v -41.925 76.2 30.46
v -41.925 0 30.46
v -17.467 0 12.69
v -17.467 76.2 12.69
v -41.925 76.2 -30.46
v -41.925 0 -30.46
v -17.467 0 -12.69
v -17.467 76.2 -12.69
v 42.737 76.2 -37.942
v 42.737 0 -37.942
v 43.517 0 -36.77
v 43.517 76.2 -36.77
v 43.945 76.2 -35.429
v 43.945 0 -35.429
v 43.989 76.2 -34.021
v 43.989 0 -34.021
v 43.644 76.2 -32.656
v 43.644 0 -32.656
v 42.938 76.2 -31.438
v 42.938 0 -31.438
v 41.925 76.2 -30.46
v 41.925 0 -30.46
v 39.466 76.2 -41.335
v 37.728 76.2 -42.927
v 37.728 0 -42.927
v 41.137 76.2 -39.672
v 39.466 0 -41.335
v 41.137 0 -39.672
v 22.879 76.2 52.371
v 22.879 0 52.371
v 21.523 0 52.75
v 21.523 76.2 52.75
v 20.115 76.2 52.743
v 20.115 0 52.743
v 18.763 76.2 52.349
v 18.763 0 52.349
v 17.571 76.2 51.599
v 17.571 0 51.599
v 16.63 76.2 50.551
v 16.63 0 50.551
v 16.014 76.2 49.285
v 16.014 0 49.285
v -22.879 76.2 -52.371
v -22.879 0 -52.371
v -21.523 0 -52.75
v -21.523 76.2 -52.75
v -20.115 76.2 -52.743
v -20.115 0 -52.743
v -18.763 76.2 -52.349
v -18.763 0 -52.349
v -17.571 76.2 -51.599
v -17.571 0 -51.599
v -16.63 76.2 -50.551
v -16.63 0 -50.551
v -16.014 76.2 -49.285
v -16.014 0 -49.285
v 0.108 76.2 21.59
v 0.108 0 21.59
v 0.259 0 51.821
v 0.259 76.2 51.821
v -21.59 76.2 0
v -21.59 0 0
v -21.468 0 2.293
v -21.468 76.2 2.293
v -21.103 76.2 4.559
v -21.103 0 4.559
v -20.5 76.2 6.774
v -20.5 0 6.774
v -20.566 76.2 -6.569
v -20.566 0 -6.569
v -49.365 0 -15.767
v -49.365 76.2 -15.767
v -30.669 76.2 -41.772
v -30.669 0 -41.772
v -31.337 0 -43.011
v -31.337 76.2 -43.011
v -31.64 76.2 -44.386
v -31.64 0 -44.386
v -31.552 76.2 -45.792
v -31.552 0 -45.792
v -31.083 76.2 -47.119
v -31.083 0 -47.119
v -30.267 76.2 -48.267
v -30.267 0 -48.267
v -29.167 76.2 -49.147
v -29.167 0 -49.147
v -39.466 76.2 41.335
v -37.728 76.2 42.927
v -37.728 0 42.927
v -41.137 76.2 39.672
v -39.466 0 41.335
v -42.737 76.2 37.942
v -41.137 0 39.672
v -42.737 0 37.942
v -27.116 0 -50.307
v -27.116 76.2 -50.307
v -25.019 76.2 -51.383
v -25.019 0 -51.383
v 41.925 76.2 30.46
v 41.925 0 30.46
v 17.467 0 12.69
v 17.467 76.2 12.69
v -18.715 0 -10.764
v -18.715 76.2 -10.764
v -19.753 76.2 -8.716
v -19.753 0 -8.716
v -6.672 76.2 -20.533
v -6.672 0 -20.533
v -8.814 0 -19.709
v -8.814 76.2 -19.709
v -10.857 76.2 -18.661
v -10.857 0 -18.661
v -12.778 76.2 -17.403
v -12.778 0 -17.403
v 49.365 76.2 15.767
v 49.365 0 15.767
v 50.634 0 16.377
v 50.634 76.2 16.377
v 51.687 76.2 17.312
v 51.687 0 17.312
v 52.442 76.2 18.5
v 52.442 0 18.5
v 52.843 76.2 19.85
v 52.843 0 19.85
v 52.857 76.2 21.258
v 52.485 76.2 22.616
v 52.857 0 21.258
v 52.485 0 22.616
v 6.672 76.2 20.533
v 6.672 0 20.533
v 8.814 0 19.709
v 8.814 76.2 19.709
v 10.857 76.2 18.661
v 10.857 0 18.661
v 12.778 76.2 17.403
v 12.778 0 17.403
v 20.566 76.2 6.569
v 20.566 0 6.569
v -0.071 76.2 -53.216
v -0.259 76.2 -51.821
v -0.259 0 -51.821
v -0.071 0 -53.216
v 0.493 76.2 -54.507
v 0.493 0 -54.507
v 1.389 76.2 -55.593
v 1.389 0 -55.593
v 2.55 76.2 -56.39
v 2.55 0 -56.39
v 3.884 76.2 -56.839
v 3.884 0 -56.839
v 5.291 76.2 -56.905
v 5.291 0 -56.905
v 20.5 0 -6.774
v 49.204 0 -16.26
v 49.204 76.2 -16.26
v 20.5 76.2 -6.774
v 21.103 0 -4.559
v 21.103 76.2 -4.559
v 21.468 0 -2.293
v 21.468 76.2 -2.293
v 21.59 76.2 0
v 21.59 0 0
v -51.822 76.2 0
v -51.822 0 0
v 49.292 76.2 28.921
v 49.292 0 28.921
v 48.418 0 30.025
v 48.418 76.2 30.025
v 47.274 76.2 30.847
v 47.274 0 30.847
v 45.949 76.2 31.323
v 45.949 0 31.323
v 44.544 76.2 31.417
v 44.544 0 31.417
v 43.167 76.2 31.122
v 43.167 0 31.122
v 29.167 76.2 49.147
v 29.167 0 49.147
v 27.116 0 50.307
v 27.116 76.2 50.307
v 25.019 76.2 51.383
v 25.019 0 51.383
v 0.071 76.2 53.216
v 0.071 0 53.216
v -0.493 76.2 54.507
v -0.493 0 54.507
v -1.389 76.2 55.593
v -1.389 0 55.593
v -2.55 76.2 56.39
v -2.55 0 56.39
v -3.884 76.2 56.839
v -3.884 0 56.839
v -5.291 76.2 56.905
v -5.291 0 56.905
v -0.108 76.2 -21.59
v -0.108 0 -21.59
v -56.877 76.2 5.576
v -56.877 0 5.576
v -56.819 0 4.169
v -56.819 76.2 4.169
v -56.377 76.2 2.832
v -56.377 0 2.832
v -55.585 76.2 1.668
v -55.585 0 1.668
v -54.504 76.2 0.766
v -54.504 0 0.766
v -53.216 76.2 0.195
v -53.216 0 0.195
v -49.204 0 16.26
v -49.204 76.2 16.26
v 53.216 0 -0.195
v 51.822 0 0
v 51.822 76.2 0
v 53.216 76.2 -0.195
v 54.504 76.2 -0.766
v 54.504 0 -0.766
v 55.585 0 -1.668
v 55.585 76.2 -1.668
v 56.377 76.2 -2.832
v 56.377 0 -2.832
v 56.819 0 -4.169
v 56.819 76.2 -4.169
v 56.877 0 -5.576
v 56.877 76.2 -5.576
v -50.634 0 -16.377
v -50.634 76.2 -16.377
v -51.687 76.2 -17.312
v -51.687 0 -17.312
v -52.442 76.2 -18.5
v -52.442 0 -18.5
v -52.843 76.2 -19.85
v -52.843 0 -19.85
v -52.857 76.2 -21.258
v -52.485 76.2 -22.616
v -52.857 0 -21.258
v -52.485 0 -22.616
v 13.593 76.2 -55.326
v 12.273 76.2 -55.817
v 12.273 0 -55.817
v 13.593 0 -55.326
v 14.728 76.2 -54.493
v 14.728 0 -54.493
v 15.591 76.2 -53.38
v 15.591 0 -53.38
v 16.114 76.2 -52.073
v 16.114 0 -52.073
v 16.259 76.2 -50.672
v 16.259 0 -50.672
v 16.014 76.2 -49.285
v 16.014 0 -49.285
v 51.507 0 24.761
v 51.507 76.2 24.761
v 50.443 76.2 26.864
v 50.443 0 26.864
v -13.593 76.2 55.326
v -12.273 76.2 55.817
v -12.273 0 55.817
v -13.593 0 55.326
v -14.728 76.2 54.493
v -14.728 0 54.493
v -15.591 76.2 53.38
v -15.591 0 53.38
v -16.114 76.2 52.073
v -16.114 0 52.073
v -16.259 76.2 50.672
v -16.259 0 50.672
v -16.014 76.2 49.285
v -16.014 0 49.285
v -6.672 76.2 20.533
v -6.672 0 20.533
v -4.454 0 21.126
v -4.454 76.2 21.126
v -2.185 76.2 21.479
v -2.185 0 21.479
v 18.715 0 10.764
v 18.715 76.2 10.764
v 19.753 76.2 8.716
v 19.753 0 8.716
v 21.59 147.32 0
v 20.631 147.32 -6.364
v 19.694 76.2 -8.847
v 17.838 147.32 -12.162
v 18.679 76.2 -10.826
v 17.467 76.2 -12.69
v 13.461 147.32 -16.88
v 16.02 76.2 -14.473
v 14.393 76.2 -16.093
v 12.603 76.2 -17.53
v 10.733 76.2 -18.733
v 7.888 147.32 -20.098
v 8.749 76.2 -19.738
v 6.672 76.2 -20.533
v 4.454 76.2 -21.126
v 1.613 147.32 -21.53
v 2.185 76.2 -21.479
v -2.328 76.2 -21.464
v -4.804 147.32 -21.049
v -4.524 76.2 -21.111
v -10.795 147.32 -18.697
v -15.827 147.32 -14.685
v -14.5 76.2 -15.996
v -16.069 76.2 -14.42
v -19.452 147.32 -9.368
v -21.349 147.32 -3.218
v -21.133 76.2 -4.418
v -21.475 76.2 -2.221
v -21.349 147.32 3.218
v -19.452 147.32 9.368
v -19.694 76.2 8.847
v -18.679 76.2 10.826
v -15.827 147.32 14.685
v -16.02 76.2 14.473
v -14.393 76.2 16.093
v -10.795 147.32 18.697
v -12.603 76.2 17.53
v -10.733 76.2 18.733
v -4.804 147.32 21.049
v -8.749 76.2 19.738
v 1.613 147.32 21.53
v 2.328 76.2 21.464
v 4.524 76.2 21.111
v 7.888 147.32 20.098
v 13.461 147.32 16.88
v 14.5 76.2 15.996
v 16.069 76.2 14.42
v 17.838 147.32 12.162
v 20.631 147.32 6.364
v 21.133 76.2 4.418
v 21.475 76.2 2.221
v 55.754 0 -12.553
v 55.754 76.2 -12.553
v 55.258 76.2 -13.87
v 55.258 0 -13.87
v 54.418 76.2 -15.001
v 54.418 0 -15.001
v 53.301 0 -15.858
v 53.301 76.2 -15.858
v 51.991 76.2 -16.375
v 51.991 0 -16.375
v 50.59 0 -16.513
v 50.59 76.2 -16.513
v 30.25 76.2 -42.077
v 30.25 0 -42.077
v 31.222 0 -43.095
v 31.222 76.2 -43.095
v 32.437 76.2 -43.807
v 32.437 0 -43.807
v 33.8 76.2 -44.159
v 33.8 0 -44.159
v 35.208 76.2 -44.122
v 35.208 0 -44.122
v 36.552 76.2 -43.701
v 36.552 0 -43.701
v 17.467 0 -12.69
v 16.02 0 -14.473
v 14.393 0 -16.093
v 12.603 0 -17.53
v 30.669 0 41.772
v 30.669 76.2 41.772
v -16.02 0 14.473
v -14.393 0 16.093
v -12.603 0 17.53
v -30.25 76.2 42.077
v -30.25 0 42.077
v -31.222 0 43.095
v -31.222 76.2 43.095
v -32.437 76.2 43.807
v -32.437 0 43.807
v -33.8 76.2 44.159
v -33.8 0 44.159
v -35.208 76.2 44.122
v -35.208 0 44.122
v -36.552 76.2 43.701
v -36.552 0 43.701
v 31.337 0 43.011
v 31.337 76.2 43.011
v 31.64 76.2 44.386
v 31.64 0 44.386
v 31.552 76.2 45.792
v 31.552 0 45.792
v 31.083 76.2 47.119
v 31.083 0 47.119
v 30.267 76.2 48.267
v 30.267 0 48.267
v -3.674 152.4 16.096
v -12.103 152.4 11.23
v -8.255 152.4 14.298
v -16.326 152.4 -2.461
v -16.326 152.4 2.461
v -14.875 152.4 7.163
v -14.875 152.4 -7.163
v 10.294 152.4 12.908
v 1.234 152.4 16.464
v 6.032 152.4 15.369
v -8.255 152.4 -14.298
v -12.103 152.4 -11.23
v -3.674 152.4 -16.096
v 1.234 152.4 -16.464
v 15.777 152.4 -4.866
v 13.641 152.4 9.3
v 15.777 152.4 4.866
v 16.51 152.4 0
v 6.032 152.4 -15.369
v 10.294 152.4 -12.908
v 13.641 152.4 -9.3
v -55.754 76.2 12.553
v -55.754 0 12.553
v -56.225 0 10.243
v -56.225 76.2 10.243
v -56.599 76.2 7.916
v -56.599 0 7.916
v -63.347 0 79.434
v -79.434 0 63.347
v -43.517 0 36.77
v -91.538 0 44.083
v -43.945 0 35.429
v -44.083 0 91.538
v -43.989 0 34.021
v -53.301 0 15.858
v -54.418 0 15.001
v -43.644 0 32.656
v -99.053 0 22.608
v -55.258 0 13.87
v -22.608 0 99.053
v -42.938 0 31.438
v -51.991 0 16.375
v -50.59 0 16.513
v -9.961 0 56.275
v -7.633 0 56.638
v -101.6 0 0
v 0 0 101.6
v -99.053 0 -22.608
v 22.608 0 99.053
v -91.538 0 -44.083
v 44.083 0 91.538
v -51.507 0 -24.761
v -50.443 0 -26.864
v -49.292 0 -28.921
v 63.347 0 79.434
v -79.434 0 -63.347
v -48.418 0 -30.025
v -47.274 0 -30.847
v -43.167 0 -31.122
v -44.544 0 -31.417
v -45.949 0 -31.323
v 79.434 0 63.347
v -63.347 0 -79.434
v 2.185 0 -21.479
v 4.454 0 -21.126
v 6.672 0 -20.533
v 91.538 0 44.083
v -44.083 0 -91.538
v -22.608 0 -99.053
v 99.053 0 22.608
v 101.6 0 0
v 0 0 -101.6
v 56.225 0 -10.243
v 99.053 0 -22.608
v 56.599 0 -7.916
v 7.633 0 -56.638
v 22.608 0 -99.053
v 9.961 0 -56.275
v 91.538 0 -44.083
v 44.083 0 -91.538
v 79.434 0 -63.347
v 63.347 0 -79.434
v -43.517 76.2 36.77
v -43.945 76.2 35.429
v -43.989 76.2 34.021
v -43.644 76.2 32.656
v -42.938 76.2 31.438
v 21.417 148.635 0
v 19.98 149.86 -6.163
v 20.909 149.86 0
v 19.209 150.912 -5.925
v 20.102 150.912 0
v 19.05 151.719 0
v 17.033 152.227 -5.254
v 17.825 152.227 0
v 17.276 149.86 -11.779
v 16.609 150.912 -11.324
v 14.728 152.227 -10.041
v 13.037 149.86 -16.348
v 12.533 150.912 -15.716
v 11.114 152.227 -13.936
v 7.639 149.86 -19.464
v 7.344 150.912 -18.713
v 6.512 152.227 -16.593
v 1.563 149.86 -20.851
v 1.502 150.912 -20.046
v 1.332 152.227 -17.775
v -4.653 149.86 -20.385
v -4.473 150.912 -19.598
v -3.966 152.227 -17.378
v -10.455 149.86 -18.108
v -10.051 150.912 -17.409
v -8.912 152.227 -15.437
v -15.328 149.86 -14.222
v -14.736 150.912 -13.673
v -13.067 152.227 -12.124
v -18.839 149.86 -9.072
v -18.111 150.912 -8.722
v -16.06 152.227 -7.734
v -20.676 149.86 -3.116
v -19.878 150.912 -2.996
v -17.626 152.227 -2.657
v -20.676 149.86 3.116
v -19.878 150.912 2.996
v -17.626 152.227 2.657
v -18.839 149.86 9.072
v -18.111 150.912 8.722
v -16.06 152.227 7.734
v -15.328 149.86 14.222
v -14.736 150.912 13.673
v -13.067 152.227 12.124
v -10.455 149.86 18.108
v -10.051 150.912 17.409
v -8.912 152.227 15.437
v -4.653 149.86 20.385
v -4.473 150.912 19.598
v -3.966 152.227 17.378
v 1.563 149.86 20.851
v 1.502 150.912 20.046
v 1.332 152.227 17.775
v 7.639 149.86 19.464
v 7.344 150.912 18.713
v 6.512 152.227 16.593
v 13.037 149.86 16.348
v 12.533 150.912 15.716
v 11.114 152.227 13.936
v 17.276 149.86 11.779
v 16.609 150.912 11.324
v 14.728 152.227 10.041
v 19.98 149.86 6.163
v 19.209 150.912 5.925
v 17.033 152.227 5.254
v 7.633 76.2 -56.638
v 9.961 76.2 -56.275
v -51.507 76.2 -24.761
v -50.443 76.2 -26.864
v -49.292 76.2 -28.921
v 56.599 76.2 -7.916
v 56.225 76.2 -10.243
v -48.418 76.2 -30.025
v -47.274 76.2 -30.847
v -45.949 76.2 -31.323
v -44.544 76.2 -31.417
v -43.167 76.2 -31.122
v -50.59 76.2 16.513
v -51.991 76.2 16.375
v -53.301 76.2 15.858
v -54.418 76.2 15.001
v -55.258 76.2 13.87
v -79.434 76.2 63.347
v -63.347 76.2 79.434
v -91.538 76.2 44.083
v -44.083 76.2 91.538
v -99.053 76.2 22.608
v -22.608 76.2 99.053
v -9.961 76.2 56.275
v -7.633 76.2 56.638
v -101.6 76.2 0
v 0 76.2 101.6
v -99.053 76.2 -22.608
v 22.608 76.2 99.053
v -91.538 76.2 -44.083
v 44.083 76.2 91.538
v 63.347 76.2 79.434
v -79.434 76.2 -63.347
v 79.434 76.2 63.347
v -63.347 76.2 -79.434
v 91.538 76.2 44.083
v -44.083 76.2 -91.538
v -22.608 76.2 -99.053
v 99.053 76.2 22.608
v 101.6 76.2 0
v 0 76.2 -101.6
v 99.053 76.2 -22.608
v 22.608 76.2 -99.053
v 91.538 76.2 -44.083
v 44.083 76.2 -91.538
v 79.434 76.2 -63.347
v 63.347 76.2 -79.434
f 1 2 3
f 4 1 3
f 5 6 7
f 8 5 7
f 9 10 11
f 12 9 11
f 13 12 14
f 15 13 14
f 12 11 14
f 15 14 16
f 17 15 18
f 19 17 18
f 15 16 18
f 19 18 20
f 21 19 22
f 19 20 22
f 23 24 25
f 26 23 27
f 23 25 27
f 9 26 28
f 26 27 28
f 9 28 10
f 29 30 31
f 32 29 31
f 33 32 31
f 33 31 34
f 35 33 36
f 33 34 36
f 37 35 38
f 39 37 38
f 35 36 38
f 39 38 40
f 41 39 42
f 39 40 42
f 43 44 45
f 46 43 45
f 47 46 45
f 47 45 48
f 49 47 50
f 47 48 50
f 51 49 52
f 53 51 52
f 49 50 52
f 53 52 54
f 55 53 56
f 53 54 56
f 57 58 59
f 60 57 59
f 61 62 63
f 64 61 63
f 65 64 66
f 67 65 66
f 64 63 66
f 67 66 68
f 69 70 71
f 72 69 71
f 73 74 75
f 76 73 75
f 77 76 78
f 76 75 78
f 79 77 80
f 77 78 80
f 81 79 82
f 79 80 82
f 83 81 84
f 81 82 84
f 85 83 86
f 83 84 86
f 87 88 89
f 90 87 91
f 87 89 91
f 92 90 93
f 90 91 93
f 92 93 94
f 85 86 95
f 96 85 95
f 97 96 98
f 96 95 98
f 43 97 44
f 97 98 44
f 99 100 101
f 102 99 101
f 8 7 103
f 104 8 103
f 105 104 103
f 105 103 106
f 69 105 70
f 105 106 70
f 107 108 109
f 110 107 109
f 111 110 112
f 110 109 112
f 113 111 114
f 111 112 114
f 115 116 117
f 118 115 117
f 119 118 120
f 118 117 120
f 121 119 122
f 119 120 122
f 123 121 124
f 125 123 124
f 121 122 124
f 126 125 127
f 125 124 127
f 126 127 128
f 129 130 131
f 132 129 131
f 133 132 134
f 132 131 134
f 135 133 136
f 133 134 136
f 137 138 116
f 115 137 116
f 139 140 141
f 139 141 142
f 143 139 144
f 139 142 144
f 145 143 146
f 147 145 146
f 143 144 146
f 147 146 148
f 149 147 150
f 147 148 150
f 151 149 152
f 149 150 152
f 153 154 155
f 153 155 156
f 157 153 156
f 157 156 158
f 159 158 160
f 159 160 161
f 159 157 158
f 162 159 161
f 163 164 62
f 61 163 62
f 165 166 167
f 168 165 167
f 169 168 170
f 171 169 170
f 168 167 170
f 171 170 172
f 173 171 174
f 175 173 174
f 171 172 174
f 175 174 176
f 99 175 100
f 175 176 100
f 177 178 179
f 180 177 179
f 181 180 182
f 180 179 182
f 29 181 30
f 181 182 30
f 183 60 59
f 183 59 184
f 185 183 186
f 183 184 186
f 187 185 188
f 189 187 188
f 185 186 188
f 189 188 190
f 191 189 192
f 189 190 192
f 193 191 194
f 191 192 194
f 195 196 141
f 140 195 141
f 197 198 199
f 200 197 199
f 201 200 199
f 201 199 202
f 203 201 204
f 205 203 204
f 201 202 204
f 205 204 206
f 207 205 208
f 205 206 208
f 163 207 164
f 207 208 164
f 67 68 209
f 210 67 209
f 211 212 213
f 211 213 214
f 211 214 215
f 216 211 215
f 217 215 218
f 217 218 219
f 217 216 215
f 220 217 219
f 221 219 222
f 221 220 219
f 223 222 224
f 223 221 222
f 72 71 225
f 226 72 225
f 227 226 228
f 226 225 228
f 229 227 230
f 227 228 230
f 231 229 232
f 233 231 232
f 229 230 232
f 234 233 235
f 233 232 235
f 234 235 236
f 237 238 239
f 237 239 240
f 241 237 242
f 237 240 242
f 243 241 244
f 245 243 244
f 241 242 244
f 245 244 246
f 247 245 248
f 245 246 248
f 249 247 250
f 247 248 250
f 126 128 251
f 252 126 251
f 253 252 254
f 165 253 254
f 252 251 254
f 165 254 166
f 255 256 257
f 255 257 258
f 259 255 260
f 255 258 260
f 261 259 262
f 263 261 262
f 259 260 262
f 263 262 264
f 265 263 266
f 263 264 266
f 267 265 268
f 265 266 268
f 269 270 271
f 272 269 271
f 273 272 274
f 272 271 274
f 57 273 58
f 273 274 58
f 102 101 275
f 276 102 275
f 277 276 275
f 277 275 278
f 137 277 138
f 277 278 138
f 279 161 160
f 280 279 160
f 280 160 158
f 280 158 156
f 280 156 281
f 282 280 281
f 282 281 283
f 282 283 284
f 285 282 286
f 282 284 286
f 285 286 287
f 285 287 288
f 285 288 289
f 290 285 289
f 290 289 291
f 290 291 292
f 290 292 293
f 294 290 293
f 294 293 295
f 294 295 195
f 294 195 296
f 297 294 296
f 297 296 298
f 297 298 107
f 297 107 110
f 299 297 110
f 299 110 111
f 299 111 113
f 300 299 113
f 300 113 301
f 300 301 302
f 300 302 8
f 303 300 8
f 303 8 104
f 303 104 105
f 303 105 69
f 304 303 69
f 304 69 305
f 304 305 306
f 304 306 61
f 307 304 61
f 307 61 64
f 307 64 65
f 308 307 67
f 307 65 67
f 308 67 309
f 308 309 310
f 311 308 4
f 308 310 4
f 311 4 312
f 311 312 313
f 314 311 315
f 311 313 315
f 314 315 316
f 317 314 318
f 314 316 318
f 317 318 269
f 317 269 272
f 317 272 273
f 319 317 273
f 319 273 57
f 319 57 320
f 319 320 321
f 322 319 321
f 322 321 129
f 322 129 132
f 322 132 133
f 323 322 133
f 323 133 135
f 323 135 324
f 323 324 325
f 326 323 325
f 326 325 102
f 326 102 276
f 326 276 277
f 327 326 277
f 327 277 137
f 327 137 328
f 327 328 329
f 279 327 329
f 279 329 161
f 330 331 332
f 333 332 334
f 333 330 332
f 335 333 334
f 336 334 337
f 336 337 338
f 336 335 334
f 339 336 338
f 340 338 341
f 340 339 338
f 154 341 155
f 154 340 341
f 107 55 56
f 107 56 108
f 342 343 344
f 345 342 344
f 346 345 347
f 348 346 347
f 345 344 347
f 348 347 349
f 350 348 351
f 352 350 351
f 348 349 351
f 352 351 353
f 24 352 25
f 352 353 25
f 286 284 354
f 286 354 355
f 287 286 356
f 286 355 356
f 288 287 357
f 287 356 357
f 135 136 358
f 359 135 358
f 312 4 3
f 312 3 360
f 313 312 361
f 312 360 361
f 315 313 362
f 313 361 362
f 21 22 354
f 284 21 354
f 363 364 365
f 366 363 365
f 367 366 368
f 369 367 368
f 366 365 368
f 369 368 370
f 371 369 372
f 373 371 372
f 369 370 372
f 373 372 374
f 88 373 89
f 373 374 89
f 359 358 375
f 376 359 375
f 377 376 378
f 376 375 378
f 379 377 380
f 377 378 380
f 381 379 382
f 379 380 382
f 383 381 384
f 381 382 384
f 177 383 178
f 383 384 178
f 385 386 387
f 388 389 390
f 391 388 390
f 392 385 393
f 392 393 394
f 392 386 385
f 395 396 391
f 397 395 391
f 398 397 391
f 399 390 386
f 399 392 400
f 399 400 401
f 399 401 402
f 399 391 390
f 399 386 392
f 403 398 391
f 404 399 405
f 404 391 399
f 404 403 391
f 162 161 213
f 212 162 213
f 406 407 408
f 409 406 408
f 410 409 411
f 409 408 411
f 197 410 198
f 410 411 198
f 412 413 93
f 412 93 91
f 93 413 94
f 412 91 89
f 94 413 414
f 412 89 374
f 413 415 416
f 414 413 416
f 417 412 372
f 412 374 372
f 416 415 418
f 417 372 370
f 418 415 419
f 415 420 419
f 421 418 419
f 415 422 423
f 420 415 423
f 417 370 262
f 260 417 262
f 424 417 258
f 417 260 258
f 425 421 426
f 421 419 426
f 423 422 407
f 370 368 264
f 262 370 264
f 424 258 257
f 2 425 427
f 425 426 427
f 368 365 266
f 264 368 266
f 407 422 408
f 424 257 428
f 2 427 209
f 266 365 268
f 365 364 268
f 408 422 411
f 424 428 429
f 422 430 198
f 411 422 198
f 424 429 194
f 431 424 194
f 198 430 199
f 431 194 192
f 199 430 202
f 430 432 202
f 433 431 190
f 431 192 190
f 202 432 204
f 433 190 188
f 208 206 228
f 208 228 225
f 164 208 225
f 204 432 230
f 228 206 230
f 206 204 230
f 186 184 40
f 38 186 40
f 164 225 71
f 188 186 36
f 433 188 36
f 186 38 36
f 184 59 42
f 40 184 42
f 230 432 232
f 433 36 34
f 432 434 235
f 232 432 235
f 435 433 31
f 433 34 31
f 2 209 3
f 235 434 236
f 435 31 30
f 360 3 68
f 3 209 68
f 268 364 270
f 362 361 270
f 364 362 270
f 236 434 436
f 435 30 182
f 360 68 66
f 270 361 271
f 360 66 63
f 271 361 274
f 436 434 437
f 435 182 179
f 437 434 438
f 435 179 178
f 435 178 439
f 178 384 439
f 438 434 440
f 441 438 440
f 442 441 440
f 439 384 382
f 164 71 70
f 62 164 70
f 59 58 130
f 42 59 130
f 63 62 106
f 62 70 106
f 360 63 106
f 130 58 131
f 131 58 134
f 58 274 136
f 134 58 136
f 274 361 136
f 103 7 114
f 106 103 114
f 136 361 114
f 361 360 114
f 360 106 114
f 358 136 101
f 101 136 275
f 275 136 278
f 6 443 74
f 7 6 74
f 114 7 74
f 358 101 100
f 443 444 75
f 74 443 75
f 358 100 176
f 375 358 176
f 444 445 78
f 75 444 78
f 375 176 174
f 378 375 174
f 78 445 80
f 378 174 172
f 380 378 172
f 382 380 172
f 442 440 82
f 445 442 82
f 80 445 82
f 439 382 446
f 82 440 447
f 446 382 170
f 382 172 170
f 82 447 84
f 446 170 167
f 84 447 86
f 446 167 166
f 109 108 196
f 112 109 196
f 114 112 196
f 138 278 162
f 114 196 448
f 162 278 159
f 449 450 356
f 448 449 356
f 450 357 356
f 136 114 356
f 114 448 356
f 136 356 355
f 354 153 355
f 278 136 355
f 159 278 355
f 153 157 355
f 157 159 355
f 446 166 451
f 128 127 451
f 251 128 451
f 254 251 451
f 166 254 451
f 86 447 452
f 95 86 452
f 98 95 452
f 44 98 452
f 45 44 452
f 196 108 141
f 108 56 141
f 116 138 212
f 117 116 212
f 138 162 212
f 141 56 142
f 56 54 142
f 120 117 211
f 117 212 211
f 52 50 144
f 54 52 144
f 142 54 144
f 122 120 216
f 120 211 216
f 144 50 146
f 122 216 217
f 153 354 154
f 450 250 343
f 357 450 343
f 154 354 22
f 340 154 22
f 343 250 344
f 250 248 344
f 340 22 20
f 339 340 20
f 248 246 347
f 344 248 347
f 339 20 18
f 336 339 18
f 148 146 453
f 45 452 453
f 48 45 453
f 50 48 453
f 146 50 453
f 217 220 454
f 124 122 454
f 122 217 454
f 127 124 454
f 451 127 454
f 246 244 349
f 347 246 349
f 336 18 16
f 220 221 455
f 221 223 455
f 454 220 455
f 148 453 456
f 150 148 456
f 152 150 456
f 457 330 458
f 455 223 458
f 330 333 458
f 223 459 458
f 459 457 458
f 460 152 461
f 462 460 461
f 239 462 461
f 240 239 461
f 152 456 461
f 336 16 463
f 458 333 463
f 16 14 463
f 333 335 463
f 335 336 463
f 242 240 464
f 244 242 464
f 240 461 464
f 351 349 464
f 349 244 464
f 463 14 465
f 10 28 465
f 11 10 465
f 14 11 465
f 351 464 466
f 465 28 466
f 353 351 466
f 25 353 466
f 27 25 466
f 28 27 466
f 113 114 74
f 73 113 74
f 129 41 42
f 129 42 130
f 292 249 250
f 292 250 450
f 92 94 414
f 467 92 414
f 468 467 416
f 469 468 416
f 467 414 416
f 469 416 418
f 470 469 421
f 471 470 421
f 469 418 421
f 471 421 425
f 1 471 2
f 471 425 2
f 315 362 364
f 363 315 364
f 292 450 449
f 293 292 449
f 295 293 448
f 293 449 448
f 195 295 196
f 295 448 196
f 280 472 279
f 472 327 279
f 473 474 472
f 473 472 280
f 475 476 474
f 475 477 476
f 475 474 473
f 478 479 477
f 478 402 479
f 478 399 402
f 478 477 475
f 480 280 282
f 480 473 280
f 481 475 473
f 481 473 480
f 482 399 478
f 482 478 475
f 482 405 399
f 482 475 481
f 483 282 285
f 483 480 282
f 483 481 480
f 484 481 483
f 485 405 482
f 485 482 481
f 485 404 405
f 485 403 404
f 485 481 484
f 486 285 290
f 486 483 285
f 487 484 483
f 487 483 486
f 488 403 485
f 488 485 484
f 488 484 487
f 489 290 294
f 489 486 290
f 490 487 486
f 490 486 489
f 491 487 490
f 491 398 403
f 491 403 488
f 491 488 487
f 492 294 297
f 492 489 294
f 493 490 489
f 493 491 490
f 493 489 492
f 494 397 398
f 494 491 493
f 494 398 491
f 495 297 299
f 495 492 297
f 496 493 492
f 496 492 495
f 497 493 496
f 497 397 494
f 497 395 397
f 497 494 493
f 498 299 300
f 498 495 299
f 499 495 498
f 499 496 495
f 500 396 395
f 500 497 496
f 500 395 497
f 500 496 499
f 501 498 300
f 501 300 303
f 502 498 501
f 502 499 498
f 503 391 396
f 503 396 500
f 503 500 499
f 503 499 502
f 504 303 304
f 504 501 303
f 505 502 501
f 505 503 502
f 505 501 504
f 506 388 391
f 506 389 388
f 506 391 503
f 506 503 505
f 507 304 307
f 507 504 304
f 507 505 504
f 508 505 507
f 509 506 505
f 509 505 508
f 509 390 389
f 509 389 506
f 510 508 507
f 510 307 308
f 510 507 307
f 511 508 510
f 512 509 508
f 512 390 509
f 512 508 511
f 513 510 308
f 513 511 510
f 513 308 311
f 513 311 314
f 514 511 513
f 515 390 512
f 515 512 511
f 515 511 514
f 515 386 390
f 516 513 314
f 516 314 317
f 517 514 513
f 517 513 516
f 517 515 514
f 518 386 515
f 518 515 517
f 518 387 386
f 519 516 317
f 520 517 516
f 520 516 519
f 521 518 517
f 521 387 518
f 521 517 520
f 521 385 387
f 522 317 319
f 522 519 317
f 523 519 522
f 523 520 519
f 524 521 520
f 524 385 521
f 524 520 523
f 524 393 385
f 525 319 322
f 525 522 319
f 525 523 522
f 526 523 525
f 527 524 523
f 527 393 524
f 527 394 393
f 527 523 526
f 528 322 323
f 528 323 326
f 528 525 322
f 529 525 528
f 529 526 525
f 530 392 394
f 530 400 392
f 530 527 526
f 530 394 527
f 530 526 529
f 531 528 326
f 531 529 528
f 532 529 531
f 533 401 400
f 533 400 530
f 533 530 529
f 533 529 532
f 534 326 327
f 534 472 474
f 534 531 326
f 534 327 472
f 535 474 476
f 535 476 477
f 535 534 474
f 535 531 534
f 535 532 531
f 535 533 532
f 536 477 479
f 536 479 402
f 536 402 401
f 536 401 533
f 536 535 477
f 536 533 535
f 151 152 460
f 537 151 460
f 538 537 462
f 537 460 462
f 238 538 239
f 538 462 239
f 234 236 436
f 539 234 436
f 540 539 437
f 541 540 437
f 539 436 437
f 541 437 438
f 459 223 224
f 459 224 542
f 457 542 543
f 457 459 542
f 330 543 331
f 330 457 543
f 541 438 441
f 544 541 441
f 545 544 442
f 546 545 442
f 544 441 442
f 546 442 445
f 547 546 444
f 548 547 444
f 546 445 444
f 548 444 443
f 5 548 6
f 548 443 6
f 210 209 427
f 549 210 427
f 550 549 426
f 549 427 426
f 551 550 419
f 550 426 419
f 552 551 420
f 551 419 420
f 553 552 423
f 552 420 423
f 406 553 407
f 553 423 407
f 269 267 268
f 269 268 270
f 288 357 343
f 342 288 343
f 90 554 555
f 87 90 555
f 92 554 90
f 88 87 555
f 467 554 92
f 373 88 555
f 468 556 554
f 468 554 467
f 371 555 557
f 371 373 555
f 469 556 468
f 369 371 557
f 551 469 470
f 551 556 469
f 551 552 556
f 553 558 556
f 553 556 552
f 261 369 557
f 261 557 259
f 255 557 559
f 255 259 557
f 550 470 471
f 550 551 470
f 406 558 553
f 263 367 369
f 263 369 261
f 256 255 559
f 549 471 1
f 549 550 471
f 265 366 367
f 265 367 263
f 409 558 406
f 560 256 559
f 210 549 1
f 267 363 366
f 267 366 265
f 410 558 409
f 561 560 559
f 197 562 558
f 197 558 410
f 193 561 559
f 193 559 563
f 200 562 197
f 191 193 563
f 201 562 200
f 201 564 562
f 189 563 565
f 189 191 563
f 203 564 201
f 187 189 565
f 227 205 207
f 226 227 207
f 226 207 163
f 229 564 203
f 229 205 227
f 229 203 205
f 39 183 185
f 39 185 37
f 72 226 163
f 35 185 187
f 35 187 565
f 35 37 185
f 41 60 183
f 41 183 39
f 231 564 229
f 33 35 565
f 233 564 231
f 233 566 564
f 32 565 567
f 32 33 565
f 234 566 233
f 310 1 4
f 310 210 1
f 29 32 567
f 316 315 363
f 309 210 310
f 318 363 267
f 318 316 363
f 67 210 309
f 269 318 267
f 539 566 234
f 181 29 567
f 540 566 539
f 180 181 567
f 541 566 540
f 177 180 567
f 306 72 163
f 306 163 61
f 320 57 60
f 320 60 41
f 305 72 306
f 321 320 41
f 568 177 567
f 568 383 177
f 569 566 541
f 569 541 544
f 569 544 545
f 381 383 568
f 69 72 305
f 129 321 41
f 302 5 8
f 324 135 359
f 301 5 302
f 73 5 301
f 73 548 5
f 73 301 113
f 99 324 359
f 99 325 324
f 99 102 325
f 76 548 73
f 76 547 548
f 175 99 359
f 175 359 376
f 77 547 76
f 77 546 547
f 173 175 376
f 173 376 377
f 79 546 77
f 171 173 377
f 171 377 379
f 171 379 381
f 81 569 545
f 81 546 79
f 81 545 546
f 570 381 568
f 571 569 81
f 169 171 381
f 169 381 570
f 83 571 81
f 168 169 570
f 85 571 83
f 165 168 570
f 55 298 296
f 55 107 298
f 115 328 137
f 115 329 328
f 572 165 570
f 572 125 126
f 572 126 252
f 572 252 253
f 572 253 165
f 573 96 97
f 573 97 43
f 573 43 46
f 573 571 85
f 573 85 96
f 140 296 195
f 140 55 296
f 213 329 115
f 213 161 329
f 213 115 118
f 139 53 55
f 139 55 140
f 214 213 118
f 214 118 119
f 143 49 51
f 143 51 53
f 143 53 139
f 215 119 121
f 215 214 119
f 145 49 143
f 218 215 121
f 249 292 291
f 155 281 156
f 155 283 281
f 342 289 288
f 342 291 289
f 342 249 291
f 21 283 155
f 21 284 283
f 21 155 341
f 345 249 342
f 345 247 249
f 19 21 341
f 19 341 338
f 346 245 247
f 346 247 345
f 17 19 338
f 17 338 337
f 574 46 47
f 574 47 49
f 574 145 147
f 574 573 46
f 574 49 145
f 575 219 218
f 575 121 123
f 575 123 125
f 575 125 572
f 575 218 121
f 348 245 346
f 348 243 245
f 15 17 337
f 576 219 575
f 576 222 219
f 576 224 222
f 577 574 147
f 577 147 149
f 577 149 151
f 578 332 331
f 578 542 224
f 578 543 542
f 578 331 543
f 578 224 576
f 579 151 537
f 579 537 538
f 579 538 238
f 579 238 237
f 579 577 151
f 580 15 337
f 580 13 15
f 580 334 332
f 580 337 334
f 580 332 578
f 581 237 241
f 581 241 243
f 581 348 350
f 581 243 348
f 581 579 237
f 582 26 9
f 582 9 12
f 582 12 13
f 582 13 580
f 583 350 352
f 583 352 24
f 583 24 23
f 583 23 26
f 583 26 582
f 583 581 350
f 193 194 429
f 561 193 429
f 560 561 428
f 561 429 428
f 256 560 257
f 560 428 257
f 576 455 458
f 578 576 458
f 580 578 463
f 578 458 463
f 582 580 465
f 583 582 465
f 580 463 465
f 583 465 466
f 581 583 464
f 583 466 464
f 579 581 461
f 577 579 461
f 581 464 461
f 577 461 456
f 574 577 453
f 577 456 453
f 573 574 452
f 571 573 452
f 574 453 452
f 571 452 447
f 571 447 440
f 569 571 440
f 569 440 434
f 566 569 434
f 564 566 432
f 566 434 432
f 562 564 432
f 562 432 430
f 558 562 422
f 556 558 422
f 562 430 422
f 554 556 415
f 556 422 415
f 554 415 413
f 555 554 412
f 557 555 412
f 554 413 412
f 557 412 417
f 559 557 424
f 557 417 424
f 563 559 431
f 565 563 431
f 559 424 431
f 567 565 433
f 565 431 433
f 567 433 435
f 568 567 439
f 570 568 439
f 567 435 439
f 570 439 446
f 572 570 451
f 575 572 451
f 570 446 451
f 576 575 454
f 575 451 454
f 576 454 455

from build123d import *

# Parameters (mm, degrees)
SKETCH1_R           = 101.6
BOSS_EXTRUDE1_DEPTH = 76.2
SKETCH2_R           = 21.59
BOSS_EXTRUDE2_DEPTH = 76.2
FILLET1_R           = 5.08


with BuildPart() as part:
    # Sketch1 → Boss-Extrude1 (new body)
    with BuildSketch(Plane(origin=(0, 0, 0), x_dir=(1, 0, 0), z_dir=(0, 1, 0))):
        Circle(SKETCH1_R)
        with BuildLine():
            Line((21.59, 0), (51.821602638, 0))
            ThreePointArc((51.821602638, 0), (55.584852402, 1.667617955), (56.877368749, 5.575609756))
            ThreePointArc((56.877368749, 5.575609756), (56.423832827, 9.081497074), (55.75440626, 12.552636482))
            ThreePointArc((55.75440626, 12.552636482), (53.300937227, 15.857706546), (49.204484901, 16.260294142))
            Line((49.204484901, 16.260294142), (20.499652171, 6.774390074))
            ThreePointArc((20.499652171, 6.774390074), (21.315670179, 3.430787784), (21.59, 0))
        make_face(mode=Mode.SUBTRACT)
        with BuildLine():
            Line((20.566453564, -6.568796527), (49.364825579, -15.766816277))
            ThreePointArc((49.364825579, -15.766816277), (52.442290076, -18.500350747), (52.484516777, -22.616321511))
            ThreePointArc((52.484516777, -22.616321511), (50.985809694, -25.818011346), (49.292019101, -28.920915493))
            ThreePointArc((49.292019101, -28.920915493), (45.949291463, -31.322825227), (41.92455721, -30.459973781))
            Line((41.92455721, -30.459973781), (17.466676909, -12.690283597))
            ThreePointArc((17.466676909, -12.690283597), (19.261305884, -9.753470953), (20.566453564, -6.568796527))
        make_face(mode=Mode.SUBTRACT)
        with BuildLine():
            Line((12.777568723, -17.402926119), (30.669480735, -41.771538773))
            ThreePointArc((30.669480735, -41.771538773), (31.552470563, -45.791902859), (29.167325768, -49.146613388))
            ThreePointArc((29.167325768, -49.146613388), (26.072940201, -50.855916954), (22.87879353, -52.37063401))
            ThreePointArc((22.87879353, -52.37063401), (18.762662945, -52.349013795), (16.013755891, -49.285272874))
            Line((16.013755891, -49.285272874), (6.671676909, -20.533310187))
            ThreePointArc((6.671676909, -20.533310187), (9.849777409, -19.212235294), (12.777568723, -17.402926119))
        make_face(mode=Mode.SUBTRACT)
        with BuildLine():
            Line((0.108086924, -21.589729438), (0.259436667, -51.82095322))
            ThreePointArc((0.259436667, -51.82095322), (-1.389320275, -55.592504489), (-5.290792323, -56.904569382))
            ThreePointArc((-5.290792323, -56.904569382), (-8.798906261, -56.468590815), (-12.273353548, -55.816550347))
            ThreePointArc((-12.273353548, -55.816550347), (-15.590665099, -53.379658372), (-16.013755891, -49.285272874))
            Line((-16.013755891, -49.285272874), (-6.671676909, -20.533310187))
            ThreePointArc((-6.671676909, -20.533310187), (-3.324031254, -21.332578752), (0.108086924, -21.589729438))
        make_face(mode=Mode.SUBTRACT)
        with BuildLine():
            Line((-12.602680406, -17.52998992), (-30.24970339, -42.076524866))
            ThreePointArc((-30.24970339, -42.076524866), (-33.800437989, -44.158658923), (-37.728007574, -42.926913988))
            ThreePointArc((-37.728007574, -42.926913988), (-40.309869596, -40.512182281), (-42.737496726, -37.942441587))
            ThreePointArc((-42.737496726, -37.942441587), (-43.988888982, -34.021087758), (-41.92455721, -30.459973781))
            Line((-41.92455721, -30.459973781), (-17.466676909, -12.690283597))
            ThreePointArc((-17.466676909, -12.690283597), (-15.228172958, -15.304602195), (-12.602680406, -17.52998992))
        make_face(mode=Mode.SUBTRACT)
        with BuildLine():
            Line((-20.499652171, -6.774390074), (-49.204484901, -16.260294142))
            ThreePointArc((-49.204484901, -16.260294142), (-53.300937227, -15.857706546), (-55.75440626, -12.552636482))
            ThreePointArc((-55.75440626, -12.552636482), (-56.423832827, -9.081497074), (-56.877368749, -5.575609756))
            ThreePointArc((-56.877368749, -5.575609756), (-55.584852402, -1.667617955), (-51.821602638, 0))
            Line((-51.821602638, 0), (-21.59, 0))
            ThreePointArc((-21.59, 0), (-21.315670179, -3.430787784), (-20.499652171, -6.774390074))
        make_face(mode=Mode.SUBTRACT)
        with BuildLine():
            Line((-20.566453564, 6.568796527), (-49.364825579, 15.766816277))
            ThreePointArc((-49.364825579, 15.766816277), (-52.442290076, 18.500350747), (-52.484516777, 22.616321511))
            ThreePointArc((-52.484516777, 22.616321511), (-50.985809694, 25.818011346), (-49.292019101, 28.920915493))
            ThreePointArc((-49.292019101, 28.920915493), (-45.949291463, 31.322825227), (-41.92455721, 30.459973781))
            Line((-41.92455721, 30.459973781), (-17.466676909, 12.690283597))
            ThreePointArc((-17.466676909, 12.690283597), (-19.261305884, 9.753470953), (-20.566453564, 6.568796527))
        make_face(mode=Mode.SUBTRACT)
        with BuildLine():
            Line((-12.777568723, 17.402926119), (-30.669480735, 41.771538773))
            ThreePointArc((-30.669480735, 41.771538773), (-31.552470563, 45.791902859), (-29.167325768, 49.146613388))
            ThreePointArc((-29.167325768, 49.146613388), (-26.072940201, 50.855916954), (-22.87879353, 52.37063401))
            ThreePointArc((-22.87879353, 52.37063401), (-18.762662945, 52.349013795), (-16.013755891, 49.285272874))
            Line((-16.013755891, 49.285272874), (-6.671676909, 20.533310187))
            ThreePointArc((-6.671676909, 20.533310187), (-9.849777409, 19.212235294), (-12.777568723, 17.402926119))
        make_face(mode=Mode.SUBTRACT)
        with BuildLine():
            Line((-0.108086924, 21.589729438), (-0.259436667, 51.82095322))
            ThreePointArc((-0.259436667, 51.82095322), (1.389320275, 55.592504489), (5.290792323, 56.904569382))
            ThreePointArc((5.290792323, 56.904569382), (8.798906261, 56.468590815), (12.273353548, 55.816550347))
            ThreePointArc((12.273353548, 55.816550347), (15.590665099, 53.379658372), (16.013755891, 49.285272874))
            Line((16.013755891, 49.285272874), (6.671676909, 20.533310187))
            ThreePointArc((6.671676909, 20.533310187), (3.324031254, 21.332578752), (-0.108086924, 21.589729438))
        make_face(mode=Mode.SUBTRACT)
        with BuildLine():
            Line((12.602680406, 17.52998992), (30.24970339, 42.076524866))
            ThreePointArc((30.24970339, 42.076524866), (33.800437989, 44.158658923), (37.728007574, 42.926913988))
            ThreePointArc((37.728007574, 42.926913988), (40.309869596, 40.512182281), (42.737496726, 37.942441587))
            ThreePointArc((42.737496726, 37.942441587), (43.988888982, 34.021087758), (41.92455721, 30.459973781))
            Line((41.92455721, 30.459973781), (17.466676909, 12.690283597))
            ThreePointArc((17.466676909, 12.690283597), (15.228172958, 15.304602195), (12.602680406, 17.52998992))
        make_face(mode=Mode.SUBTRACT)
    extrude(amount=BOSS_EXTRUDE1_DEPTH)

    # Sketch2 → Boss-Extrude2 (add)
    with BuildSketch(Plane(origin=(0, 76.2, 0), x_dir=(1, 0, 0), z_dir=(0, 1, 0))):
        Circle(SKETCH2_R)
    extrude(amount=BOSS_EXTRUDE2_DEPTH)

    # Fillet1
    fillet1_edges = [part.edges().sort_by_distance(p)[0] for p in [
        (-21.59, 152.4, 0),
    ]]
    fillet(fillet1_edges, radius=FILLET1_R)


solid = part.part
